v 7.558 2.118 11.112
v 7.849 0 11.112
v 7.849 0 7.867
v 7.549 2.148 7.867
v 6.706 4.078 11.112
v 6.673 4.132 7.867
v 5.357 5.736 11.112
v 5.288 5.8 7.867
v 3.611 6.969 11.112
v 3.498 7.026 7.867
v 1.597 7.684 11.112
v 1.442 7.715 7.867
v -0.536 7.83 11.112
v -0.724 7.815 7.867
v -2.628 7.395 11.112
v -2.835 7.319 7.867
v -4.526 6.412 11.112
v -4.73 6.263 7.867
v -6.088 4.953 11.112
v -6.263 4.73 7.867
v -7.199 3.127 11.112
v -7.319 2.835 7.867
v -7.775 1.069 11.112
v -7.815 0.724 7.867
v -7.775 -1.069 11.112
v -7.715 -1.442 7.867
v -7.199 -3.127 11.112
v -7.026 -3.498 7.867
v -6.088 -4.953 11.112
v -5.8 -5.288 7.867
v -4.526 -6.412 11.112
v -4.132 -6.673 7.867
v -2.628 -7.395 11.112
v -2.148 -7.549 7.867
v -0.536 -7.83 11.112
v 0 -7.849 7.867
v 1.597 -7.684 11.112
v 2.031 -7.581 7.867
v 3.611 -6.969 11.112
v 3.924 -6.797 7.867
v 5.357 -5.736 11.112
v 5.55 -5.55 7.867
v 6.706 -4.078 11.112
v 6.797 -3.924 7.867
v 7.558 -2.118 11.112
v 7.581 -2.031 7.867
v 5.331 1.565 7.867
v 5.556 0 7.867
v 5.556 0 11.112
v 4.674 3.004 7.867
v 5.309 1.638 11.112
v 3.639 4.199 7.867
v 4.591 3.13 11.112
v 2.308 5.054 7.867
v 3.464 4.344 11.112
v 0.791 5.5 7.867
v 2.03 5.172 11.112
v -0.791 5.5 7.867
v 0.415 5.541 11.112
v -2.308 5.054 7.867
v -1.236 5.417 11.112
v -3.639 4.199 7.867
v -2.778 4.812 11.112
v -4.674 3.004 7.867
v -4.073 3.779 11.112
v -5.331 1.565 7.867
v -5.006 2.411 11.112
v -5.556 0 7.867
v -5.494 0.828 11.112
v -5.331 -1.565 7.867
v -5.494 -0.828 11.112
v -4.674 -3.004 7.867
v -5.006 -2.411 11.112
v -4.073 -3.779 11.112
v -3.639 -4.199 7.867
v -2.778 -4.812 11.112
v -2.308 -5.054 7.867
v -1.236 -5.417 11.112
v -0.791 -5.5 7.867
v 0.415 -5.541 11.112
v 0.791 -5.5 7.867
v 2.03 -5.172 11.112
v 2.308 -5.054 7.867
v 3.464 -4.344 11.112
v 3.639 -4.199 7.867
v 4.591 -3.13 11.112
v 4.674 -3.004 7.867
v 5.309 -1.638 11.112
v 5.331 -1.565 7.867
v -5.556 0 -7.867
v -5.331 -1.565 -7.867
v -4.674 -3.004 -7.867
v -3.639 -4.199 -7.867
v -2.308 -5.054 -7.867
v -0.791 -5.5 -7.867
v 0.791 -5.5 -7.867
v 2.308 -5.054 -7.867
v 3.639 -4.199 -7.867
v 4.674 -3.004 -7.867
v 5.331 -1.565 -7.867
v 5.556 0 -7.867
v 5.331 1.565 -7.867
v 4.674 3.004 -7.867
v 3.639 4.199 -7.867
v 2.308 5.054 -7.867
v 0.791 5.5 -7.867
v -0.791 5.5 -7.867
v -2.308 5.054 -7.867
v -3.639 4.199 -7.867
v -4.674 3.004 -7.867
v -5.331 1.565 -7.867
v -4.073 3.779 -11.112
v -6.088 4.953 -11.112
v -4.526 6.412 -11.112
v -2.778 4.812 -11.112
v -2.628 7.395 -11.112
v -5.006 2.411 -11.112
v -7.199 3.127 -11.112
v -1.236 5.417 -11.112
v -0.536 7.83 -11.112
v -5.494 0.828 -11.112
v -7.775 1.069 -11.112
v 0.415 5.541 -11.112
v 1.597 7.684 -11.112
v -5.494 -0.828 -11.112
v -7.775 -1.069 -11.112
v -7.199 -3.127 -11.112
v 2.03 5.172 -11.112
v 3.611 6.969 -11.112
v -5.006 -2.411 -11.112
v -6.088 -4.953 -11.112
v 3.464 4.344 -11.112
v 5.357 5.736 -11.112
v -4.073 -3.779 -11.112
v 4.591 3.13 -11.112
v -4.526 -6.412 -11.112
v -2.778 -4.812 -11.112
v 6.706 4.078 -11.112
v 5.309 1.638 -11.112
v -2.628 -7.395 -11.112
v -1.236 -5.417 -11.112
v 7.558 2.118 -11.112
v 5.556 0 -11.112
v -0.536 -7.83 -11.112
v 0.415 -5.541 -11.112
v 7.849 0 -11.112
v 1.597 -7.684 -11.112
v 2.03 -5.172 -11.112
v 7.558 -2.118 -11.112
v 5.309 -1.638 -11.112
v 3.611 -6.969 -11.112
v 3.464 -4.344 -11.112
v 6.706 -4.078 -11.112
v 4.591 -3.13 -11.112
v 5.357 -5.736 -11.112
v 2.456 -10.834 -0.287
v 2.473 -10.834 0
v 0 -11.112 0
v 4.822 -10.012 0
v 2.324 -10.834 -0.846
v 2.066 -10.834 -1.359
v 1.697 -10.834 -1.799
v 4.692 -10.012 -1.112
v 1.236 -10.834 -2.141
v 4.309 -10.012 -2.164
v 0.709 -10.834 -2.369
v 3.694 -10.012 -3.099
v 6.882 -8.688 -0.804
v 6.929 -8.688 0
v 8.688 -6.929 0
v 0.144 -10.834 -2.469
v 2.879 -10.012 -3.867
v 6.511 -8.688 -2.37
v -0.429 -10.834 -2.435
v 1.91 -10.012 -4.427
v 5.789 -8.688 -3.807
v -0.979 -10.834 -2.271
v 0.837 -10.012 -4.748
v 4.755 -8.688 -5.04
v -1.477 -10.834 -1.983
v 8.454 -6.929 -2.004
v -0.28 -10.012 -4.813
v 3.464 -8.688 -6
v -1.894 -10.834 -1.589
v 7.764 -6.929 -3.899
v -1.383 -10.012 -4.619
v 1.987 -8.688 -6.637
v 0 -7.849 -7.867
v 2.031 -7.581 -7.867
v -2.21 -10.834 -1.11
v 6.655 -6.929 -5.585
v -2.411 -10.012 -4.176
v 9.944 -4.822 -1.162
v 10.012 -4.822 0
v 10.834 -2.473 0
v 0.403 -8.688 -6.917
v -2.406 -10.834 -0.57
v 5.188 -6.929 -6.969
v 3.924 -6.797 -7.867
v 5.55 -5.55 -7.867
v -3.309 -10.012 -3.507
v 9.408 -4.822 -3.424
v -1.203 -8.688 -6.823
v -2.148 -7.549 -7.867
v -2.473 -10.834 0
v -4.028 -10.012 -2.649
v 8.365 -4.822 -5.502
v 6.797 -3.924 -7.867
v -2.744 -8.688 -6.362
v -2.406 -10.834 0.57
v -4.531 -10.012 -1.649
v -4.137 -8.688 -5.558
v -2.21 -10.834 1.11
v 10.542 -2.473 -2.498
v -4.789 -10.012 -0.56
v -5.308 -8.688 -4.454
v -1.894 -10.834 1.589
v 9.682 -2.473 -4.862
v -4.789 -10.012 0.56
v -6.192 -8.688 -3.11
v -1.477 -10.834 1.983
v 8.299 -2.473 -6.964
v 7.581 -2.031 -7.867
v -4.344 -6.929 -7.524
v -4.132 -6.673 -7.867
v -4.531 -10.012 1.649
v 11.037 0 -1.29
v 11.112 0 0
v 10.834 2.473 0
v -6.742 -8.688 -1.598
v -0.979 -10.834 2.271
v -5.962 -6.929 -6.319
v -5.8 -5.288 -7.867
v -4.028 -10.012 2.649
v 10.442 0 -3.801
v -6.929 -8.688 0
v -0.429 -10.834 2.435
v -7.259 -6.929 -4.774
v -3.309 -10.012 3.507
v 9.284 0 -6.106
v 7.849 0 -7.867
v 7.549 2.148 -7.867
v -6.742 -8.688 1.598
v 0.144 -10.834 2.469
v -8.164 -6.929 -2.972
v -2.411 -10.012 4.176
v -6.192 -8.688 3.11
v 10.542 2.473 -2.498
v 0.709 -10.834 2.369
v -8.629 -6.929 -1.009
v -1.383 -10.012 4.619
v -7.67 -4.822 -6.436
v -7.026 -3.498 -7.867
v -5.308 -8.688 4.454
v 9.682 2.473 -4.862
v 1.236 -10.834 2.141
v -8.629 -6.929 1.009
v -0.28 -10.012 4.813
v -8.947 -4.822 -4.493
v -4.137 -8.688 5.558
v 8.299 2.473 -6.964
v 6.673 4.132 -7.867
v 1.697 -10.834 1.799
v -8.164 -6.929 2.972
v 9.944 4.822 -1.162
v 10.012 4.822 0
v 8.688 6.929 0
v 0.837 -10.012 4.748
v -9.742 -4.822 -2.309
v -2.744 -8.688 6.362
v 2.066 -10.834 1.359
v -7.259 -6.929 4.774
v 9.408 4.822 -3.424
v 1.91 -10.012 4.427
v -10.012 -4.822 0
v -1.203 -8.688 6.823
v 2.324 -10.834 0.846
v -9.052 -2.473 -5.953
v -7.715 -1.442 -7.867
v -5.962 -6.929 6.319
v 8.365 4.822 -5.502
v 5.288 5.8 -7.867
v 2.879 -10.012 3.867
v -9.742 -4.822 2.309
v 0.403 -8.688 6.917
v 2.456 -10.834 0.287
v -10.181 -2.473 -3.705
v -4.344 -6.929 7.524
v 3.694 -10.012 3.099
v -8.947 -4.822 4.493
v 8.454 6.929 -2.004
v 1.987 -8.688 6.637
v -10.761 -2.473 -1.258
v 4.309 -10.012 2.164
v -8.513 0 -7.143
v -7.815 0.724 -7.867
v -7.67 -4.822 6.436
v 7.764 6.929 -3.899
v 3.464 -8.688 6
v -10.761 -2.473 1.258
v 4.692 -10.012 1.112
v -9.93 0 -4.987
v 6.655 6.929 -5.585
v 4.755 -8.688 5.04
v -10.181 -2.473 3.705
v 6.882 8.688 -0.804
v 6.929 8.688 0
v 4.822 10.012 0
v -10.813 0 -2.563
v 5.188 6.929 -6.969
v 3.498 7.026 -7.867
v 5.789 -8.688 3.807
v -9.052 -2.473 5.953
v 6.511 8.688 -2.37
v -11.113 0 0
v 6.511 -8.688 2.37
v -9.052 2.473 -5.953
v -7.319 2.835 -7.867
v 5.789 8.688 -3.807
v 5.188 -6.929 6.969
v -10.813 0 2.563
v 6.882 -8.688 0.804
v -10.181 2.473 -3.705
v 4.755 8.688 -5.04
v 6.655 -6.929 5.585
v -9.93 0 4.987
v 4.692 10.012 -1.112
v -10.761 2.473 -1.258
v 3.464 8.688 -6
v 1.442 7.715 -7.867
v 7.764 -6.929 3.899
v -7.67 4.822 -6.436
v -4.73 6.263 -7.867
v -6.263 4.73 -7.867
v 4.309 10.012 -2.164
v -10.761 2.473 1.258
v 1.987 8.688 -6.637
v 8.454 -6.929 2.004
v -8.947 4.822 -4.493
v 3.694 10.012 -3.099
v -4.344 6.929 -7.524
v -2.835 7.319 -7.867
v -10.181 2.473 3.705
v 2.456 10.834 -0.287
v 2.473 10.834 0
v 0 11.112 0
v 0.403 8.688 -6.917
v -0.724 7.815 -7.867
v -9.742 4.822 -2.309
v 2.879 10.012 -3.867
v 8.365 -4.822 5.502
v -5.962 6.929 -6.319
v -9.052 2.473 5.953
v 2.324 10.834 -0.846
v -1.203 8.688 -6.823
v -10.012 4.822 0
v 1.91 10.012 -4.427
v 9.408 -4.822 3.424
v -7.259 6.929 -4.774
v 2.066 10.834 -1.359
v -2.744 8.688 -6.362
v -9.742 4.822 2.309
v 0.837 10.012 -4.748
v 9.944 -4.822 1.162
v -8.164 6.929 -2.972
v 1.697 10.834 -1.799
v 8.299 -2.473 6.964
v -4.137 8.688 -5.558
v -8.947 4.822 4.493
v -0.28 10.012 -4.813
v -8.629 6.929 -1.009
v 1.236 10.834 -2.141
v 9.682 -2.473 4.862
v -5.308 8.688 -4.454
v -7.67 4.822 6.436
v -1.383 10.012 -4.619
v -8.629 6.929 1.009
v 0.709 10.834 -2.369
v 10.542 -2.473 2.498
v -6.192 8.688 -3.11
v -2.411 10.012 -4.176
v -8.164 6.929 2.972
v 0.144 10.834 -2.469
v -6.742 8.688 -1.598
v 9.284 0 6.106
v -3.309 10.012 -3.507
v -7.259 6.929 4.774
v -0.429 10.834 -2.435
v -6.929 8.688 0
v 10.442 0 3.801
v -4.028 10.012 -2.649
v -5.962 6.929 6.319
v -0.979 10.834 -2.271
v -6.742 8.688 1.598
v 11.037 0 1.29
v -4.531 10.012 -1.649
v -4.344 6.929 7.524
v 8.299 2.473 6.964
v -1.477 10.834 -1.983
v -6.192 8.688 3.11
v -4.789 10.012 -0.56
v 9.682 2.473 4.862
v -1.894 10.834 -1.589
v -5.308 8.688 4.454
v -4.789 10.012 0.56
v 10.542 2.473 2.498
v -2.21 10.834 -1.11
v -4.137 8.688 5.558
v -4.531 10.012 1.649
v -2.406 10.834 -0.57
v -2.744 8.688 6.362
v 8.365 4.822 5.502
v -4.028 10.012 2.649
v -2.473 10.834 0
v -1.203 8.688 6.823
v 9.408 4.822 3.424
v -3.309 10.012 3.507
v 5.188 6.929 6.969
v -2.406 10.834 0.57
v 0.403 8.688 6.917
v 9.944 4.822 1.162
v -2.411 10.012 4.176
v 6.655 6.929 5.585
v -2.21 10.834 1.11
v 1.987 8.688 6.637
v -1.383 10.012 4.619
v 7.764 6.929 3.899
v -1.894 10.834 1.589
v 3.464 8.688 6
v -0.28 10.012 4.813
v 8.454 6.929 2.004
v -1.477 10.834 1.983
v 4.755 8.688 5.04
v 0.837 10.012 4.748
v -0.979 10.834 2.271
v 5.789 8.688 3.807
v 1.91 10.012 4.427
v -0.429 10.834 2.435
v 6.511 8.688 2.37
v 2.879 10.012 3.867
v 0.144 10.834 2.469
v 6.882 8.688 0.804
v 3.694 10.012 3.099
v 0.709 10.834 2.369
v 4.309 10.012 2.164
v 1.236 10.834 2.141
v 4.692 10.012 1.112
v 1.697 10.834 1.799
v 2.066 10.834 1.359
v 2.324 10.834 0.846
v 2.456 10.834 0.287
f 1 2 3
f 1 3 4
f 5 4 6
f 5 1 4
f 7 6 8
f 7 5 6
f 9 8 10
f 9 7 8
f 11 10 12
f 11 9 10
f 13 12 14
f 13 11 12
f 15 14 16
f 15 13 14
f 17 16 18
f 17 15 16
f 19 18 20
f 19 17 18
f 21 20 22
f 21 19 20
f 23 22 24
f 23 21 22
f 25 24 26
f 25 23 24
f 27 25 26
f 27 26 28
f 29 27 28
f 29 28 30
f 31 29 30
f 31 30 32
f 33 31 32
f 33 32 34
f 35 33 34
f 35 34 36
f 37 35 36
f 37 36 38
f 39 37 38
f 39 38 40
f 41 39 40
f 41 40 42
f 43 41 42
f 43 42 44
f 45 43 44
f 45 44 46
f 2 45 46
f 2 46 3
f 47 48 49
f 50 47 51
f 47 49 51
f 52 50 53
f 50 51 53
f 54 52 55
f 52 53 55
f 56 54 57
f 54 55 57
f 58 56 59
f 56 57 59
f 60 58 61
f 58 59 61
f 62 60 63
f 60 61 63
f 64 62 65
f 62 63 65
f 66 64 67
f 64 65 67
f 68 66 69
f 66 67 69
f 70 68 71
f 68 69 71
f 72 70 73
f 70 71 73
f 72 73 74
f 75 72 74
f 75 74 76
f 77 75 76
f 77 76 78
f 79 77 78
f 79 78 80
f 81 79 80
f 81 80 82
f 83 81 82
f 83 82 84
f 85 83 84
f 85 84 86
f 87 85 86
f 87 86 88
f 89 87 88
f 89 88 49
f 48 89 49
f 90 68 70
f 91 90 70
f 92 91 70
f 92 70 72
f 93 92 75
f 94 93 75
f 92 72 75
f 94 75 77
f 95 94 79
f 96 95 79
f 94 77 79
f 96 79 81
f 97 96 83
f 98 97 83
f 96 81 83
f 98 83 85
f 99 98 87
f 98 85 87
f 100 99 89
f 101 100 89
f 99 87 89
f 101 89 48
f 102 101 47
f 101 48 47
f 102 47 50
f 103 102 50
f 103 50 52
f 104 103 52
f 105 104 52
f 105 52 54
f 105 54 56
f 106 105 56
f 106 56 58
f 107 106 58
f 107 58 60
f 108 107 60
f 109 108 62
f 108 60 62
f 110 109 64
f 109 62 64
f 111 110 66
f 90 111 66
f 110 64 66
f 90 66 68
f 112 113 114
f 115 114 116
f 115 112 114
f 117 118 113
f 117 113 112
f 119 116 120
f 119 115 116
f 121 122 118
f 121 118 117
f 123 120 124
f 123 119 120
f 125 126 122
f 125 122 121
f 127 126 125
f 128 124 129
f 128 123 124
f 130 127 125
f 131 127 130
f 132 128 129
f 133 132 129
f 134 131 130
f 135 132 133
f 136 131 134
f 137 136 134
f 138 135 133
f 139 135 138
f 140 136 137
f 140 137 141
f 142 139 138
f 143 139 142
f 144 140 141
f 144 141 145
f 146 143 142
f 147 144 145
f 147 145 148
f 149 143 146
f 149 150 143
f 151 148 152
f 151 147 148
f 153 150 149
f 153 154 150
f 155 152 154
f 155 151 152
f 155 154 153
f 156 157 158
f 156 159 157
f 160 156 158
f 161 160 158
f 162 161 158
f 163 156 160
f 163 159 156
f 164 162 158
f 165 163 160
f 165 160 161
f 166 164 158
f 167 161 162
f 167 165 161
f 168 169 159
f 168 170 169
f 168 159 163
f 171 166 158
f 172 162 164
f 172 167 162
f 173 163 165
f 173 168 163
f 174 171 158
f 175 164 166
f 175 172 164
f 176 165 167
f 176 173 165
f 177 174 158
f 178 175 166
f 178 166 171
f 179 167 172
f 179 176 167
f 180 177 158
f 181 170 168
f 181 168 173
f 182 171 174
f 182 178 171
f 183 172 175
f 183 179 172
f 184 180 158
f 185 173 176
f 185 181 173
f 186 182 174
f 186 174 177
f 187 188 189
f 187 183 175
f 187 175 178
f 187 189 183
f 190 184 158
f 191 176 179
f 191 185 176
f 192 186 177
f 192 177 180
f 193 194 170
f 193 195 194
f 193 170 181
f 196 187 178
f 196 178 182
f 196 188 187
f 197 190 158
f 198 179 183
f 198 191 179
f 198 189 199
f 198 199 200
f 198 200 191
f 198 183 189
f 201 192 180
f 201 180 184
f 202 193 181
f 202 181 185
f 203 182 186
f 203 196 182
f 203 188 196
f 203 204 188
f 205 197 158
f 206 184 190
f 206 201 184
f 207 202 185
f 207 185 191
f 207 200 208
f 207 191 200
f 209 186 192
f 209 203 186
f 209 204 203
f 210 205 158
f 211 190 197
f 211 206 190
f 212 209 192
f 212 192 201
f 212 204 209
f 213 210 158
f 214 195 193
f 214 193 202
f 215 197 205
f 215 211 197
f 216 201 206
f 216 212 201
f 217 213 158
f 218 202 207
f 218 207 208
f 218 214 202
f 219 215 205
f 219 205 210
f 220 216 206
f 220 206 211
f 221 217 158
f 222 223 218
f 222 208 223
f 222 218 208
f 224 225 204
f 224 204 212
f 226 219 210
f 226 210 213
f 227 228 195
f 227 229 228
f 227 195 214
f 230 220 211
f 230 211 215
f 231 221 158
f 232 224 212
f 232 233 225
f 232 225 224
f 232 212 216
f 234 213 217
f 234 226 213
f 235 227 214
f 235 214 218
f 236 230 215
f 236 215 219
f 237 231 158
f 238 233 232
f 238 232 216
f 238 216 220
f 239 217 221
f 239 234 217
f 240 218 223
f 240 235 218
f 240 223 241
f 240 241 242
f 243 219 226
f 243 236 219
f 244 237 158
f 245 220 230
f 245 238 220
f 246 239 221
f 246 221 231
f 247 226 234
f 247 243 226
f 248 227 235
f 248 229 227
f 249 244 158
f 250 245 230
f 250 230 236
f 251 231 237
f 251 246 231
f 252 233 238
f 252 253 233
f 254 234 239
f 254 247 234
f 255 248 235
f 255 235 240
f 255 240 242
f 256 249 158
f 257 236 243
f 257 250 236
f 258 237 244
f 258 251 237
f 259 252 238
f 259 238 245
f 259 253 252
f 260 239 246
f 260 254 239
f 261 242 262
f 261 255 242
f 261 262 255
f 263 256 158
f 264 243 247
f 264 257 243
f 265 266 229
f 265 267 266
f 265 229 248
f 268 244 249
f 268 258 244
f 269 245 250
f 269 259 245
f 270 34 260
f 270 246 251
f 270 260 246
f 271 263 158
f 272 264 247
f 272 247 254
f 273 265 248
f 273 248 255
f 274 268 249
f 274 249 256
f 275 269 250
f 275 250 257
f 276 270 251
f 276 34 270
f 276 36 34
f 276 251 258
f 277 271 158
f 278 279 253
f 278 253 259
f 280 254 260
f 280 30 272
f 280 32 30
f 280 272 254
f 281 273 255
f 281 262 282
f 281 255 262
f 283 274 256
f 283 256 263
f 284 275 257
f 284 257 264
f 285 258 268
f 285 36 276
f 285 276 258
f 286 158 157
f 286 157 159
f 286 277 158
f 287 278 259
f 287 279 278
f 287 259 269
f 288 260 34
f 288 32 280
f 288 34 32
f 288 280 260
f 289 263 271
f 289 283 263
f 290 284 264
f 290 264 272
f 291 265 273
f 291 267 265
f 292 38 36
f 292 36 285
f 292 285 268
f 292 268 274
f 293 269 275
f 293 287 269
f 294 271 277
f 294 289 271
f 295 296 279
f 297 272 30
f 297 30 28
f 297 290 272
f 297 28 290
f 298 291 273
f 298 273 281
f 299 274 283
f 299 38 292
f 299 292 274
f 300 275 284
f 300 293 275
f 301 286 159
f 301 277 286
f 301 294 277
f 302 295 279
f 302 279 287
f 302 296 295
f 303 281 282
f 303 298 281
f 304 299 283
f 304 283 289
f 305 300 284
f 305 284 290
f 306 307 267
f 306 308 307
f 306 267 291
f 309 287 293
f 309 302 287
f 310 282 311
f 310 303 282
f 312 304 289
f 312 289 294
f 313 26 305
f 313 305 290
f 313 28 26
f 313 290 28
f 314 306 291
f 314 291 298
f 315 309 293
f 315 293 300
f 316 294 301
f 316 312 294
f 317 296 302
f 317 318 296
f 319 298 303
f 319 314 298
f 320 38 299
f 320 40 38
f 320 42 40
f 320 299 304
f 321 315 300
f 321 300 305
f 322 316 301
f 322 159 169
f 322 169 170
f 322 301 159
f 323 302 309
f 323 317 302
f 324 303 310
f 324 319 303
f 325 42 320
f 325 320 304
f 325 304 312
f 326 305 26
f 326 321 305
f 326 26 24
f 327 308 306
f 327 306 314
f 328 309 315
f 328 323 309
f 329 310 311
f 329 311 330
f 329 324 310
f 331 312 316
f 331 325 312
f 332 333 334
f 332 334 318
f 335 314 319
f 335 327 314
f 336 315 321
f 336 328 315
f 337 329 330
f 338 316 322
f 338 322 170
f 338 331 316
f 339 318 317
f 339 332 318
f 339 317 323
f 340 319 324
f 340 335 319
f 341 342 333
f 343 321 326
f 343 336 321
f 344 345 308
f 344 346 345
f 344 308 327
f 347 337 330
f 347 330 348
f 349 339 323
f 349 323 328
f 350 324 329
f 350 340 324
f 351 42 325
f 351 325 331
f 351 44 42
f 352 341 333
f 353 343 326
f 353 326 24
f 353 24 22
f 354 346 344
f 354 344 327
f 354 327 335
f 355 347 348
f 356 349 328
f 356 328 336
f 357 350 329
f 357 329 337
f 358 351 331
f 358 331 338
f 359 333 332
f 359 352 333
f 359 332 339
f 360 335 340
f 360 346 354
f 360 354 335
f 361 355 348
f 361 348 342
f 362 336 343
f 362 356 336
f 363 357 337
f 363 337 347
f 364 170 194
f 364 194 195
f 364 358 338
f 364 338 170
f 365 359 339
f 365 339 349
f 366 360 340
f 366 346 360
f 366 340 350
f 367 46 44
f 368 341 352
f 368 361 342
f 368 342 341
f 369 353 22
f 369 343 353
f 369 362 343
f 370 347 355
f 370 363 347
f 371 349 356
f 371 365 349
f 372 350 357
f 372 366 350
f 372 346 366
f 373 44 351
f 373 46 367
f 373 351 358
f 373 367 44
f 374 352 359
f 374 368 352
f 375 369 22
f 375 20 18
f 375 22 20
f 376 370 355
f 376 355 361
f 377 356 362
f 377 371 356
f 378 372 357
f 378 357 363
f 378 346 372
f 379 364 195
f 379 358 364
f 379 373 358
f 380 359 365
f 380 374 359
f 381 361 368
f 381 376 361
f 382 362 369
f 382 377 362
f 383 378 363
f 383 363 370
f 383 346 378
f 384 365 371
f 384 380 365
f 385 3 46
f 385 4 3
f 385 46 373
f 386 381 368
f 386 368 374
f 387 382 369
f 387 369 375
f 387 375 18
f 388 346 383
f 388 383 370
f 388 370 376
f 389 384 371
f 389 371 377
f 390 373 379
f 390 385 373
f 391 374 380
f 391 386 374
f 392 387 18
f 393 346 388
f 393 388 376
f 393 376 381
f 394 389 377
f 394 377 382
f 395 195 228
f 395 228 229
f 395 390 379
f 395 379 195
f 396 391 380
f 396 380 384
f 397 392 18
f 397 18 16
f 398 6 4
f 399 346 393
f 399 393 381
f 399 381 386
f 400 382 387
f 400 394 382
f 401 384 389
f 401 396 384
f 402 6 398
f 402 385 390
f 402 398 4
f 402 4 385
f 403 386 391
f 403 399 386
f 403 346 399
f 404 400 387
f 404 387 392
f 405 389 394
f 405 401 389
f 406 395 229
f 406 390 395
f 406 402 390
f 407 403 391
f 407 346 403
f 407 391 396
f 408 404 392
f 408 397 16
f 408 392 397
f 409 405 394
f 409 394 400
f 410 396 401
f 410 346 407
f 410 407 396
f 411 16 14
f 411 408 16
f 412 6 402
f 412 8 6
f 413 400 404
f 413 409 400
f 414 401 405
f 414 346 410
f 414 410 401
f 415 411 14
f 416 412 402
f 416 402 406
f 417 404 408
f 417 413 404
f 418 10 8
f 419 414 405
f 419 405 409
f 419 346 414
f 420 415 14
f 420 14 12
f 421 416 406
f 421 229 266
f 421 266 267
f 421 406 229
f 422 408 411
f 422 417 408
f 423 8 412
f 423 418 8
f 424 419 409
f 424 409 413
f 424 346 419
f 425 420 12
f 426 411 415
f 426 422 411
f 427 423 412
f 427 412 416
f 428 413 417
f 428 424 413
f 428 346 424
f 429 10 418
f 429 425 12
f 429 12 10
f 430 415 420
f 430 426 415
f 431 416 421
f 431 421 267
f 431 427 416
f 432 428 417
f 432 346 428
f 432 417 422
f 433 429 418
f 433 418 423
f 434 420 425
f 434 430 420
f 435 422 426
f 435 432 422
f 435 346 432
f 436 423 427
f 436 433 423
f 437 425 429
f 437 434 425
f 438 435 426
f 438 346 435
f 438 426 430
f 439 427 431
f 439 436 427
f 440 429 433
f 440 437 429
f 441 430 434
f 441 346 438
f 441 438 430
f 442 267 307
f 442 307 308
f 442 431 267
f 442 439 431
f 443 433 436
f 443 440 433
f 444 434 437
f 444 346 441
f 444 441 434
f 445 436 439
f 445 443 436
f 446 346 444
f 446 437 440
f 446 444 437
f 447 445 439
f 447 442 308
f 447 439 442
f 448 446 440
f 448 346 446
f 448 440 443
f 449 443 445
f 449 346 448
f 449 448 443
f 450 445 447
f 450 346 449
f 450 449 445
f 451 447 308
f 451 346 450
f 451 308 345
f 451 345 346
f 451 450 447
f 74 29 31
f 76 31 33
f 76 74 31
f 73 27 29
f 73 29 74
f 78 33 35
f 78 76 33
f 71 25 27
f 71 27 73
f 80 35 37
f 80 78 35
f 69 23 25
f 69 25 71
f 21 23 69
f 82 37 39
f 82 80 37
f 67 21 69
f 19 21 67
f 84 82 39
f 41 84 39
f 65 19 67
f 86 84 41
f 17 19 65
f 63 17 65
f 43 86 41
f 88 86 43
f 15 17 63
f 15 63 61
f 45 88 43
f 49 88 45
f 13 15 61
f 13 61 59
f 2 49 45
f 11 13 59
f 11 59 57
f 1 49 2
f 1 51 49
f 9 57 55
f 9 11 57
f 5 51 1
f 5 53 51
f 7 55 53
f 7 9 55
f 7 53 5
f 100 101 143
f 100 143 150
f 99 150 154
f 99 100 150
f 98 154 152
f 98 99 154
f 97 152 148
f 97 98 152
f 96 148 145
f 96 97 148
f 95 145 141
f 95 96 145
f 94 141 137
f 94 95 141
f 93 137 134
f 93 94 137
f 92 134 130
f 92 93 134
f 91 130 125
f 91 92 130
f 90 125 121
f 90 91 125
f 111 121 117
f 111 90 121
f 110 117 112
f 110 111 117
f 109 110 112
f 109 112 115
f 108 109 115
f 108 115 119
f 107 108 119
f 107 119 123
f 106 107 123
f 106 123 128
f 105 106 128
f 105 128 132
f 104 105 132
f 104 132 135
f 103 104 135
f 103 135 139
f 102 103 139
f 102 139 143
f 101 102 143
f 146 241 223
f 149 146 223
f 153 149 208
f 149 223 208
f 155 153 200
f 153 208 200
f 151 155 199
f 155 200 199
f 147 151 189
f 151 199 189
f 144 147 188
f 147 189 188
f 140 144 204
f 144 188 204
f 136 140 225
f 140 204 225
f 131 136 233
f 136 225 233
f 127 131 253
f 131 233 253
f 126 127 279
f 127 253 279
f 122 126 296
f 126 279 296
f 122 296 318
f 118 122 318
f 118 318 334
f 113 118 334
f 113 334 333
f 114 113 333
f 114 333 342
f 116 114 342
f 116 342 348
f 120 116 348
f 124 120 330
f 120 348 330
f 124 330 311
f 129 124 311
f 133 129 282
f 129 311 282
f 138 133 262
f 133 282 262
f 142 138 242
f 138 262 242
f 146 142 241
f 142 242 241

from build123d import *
from build123d.topology import SkipClean

# Parameters (mm, degrees)
SKETCH2_R           = 5.55625
EXTRUDE1_DEPTH      = 25.4
EXTRUDE2_REACH      = 26.641
SKETCH3_R           = 11.1125
BOSS_EXTRUDE1_START = 3.24566237
SKETCH4_R           = 7.8486
SKETCH4_R_2         = 5.55625
BOSS_EXTRUDE1_DEPTH = 3.24566237
SKETCH6_R           = 7.8486
SKETCH6_R_2         = 5.55625
BOSS_EXTRUDE2_DEPTH = 3.24566237


with BuildPart() as part:
    # Sketch1 → Revolve1 (revolve)
    with BuildSketch(Plane.XY):
        with BuildLine():
            Line((0, 11.1125), (0, -11.1125))
            ThreePointArc((0, -11.1125), (11.1125, 0), (0, 11.1125))
        make_face()
    revolve(axis=Axis((0, -11.1125, 0), (0, 1, 0)))

    # Sketch2 → Extrude1 (cut, symmetric)
    with BuildSketch(Plane.XY):
        with Locations(Location((0, 0, 0), (0, 0, 180))):
            Circle(SKETCH2_R)
    extrude(amount=EXTRUDE1_DEPTH, both=True, mode=Mode.SUBTRACT)

    # Sketch3 → Extrude2 (cut, up to next)
    with BuildSketch(Plane.XY.offset(7.86683763), mode=Mode.PRIVATE) as extrude2_sk1:
        Circle(SKETCH3_R)
    extrude2_tool1 = extrude(extrude2_sk1.sketch, amount=EXTRUDE2_REACH, mode=Mode.PRIVATE) & part.part
    extrude2 = extrude2_tool1.solids().sort_by_distance((0, 0, 7.866838))[0]
    add(extrude2, mode=Mode.SUBTRACT)

    # Sketch4 → Boss-Extrude1 (add)
    with SkipClean():  # the faces are left unmerged after this step: merging them gives an invalid solid
        with BuildSketch(Plane.XY.offset(7.86683763).offset(BOSS_EXTRUDE1_START)):
            Circle(SKETCH4_R)
            Circle(SKETCH4_R_2, mode=Mode.SUBTRACT)
        extrude(amount=-BOSS_EXTRUDE1_DEPTH)

    # Mirror1: Extrude2 across plane
    with SkipClean():  # the faces are left unmerged after this step: merging them gives an invalid solid
        add(extrude2.mirror(Plane.XY), mode=Mode.SUBTRACT)

    # Sketch6 → Boss-Extrude2 (add)
    with SkipClean():  # the faces are left unmerged after this step: merging them gives an invalid solid
        with BuildSketch(Plane(origin=(0, 0, -7.86683763), x_dir=(-1, 0, 0), z_dir=(0, 0, -1))):
            with Locations(Location((0, 0, 0), (0, 0, 180))):
                Circle(SKETCH6_R)
            with Locations(Location((0, 0, 0), (0, 0, 180))):
                Circle(SKETCH6_R_2, mode=Mode.SUBTRACT)
        extrude(amount=BOSS_EXTRUDE2_DEPTH)


solid = part.part
